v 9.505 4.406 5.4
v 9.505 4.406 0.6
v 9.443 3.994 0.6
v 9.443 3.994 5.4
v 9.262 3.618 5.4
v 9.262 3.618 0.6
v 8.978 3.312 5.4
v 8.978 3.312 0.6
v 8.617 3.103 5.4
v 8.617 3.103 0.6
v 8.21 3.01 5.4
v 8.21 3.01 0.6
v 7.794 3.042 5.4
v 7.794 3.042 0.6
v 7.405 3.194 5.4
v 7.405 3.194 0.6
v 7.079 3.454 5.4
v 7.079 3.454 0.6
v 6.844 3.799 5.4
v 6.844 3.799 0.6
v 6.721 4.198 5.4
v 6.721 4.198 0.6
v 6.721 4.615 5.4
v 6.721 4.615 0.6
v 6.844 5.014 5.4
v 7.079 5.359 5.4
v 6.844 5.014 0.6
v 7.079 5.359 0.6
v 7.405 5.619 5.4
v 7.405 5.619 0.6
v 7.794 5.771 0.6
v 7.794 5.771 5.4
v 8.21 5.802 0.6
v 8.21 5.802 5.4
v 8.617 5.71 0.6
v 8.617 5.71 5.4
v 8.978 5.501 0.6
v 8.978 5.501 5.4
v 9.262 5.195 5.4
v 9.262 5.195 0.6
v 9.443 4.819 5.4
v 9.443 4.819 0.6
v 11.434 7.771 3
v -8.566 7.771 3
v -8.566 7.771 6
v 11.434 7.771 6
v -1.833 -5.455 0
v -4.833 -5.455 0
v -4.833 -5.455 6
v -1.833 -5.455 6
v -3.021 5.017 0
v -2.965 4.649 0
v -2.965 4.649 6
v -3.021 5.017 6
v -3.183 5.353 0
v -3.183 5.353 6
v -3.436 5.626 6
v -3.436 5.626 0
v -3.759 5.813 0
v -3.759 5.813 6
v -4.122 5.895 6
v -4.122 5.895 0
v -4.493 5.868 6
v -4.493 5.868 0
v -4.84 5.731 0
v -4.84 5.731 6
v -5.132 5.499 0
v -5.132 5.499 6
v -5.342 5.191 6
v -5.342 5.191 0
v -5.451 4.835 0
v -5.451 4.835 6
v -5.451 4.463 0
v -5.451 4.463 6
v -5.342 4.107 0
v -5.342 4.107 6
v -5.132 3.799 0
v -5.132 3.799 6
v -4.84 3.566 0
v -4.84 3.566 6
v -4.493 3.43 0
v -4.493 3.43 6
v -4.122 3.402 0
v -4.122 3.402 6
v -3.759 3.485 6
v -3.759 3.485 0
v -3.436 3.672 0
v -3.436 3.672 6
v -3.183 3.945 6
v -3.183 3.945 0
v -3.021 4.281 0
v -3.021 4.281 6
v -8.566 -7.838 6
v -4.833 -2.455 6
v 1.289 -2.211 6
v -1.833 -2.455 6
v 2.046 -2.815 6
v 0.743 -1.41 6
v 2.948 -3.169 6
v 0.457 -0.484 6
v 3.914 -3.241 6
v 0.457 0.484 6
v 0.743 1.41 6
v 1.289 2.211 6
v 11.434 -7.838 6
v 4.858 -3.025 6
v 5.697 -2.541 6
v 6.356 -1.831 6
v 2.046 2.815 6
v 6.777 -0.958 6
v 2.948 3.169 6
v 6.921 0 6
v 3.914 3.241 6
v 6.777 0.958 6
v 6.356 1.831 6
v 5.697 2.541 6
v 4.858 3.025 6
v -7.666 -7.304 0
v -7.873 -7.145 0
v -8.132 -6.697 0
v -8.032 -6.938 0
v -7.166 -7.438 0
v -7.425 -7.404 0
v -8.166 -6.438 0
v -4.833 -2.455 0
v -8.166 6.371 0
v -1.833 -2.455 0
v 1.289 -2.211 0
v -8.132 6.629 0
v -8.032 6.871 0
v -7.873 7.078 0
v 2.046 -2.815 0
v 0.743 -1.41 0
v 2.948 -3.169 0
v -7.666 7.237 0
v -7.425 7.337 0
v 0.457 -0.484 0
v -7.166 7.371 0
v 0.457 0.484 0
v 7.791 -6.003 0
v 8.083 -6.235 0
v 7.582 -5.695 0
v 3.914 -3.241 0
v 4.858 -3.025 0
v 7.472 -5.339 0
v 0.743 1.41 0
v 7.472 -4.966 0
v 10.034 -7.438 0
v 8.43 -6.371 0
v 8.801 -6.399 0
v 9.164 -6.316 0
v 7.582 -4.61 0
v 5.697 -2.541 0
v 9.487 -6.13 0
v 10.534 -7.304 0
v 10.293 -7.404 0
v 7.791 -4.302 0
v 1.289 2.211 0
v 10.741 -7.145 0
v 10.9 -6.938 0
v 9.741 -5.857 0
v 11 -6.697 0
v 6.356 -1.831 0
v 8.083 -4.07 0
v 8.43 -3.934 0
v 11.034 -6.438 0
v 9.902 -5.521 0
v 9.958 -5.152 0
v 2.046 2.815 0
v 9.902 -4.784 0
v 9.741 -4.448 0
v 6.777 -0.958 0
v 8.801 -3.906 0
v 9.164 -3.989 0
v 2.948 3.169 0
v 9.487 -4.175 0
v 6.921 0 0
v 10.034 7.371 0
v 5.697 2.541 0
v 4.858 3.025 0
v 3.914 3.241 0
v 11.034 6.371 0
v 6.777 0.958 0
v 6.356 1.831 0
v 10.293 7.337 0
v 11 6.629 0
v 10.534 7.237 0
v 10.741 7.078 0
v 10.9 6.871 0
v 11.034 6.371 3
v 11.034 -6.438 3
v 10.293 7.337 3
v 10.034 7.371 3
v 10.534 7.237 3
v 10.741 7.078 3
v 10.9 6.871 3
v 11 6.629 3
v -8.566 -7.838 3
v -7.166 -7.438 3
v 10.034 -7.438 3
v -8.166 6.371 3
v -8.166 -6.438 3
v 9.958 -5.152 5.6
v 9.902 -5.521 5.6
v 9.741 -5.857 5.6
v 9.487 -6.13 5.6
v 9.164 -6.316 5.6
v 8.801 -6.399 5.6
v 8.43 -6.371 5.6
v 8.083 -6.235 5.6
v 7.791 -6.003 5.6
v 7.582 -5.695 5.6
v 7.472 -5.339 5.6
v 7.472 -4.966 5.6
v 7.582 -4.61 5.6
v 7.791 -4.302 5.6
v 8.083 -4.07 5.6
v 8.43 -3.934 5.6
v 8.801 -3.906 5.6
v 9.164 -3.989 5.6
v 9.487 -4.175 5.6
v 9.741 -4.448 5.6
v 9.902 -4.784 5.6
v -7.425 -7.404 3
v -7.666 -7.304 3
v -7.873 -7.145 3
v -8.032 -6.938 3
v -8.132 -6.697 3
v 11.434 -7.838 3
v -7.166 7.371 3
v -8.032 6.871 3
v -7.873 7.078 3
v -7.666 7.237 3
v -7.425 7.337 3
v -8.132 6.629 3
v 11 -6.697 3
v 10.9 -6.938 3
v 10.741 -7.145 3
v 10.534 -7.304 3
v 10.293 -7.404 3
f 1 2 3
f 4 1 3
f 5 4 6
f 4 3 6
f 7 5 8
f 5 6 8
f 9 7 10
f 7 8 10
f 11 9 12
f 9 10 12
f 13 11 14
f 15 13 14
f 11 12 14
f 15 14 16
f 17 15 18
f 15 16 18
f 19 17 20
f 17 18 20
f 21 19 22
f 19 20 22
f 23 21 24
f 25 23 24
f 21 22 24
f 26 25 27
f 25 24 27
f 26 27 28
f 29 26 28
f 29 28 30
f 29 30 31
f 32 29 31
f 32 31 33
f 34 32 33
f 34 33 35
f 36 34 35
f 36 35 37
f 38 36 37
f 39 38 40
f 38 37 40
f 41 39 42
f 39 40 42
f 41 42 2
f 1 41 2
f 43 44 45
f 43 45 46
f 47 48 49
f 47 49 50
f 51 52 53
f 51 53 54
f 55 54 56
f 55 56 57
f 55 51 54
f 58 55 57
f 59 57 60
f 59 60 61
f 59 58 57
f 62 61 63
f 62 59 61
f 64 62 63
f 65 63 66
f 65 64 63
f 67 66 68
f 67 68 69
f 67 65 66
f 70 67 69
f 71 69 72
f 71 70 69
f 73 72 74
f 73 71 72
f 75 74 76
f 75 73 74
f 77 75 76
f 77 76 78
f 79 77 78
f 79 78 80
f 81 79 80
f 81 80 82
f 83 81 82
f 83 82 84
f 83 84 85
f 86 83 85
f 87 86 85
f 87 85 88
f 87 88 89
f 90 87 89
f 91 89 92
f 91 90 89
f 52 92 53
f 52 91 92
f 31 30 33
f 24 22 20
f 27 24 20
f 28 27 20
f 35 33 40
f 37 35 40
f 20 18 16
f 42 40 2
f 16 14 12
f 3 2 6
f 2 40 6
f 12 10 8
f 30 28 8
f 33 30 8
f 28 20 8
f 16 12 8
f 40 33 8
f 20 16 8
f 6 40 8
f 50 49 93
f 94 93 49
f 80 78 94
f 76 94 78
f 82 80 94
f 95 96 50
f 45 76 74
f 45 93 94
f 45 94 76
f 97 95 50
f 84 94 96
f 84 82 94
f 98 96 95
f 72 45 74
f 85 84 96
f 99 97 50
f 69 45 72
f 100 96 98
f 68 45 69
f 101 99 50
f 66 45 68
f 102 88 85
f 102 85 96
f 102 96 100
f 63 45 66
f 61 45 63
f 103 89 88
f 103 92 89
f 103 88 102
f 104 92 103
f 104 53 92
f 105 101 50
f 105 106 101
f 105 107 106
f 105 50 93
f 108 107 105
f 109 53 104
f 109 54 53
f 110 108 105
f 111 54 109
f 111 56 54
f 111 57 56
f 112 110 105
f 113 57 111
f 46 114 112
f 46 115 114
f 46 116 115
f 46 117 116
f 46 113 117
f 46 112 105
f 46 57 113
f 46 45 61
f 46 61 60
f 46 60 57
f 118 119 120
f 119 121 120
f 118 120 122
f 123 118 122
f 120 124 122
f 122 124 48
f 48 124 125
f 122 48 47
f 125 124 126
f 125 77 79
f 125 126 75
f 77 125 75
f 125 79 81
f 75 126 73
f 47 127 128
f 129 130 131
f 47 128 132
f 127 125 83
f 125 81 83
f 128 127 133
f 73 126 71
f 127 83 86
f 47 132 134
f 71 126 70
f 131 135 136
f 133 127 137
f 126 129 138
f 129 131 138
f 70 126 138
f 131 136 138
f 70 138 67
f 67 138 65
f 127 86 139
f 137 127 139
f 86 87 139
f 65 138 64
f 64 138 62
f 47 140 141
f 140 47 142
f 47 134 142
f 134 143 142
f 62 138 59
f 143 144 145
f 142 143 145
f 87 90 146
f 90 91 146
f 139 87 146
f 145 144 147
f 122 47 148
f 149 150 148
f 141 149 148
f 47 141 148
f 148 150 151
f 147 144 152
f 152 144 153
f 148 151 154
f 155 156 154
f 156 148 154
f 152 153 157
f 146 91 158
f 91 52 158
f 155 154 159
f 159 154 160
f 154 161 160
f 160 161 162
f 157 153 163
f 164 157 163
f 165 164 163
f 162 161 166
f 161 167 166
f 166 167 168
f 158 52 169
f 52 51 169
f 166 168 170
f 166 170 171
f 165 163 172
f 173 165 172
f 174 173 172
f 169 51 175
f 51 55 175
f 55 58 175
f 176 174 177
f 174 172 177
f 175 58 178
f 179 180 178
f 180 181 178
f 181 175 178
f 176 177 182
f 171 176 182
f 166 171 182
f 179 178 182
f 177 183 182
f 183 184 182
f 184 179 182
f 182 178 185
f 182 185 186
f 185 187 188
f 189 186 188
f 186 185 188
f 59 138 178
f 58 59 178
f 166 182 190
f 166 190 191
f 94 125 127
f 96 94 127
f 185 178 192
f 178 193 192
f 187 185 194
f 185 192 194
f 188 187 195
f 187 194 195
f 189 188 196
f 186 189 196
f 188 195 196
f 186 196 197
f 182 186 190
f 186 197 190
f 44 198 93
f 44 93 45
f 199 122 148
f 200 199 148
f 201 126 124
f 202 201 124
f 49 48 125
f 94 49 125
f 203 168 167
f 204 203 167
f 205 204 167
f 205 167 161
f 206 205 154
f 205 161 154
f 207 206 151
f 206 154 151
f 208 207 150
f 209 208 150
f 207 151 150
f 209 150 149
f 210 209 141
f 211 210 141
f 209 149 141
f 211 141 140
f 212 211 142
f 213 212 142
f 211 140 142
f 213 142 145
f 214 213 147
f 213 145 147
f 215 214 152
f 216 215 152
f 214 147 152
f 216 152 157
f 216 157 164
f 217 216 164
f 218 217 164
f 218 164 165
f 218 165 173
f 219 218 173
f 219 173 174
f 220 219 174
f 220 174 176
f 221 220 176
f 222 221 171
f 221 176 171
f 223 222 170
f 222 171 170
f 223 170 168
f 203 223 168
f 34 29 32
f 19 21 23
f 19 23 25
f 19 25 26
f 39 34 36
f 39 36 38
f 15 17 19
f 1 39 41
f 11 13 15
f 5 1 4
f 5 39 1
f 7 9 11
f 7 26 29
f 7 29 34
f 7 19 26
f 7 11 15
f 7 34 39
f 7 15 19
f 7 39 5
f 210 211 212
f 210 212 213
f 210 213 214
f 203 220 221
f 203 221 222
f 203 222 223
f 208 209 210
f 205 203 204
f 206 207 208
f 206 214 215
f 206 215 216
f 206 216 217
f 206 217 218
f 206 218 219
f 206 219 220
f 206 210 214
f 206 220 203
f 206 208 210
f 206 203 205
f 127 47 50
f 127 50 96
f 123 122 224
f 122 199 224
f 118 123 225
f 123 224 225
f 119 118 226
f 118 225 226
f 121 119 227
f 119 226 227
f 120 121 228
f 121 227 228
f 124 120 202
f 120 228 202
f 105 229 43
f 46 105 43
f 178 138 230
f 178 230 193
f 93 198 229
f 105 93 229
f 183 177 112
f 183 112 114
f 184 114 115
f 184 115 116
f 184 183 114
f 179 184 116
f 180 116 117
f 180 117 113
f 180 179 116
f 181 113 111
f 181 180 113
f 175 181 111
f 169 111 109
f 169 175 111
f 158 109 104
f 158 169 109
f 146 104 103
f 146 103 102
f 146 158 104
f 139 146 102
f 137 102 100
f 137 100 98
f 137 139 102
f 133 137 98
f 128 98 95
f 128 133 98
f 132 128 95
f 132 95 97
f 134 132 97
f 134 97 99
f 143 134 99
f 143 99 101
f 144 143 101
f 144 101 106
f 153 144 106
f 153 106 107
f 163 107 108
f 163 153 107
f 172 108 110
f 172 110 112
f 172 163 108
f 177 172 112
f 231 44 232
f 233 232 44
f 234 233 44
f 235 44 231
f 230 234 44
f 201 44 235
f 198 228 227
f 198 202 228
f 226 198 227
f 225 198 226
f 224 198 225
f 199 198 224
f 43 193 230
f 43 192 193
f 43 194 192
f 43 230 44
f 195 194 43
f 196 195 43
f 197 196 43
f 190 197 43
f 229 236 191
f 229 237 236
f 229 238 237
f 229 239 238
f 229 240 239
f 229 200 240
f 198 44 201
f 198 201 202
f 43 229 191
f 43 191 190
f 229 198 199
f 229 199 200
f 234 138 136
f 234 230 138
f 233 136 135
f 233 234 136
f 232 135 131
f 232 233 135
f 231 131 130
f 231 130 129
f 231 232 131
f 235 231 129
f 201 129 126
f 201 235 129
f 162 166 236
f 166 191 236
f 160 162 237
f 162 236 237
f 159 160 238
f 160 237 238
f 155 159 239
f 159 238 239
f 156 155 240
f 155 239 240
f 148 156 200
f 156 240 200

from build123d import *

# Parameters (mm, degrees)
F0_W     = 20
F0_H     = 15.6083446927
F0_W_2   = 3
F0_H_2   = 3
F0_R     = 1.25
F0_R_2   = 3.25
F1_DEPTH = 6
F2_R     = 1.25
F3_DEPTH = 5.6
F4_W     = 20
F4_H     = 15.6083446927
F4_W_2   = 19.2
F4_H_2   = 14.8083446927
F5_DEPTH = 3
F7_START = -0.6
F6_R     = 1.4
F7_DEPTH = 4.8
F8_R     = 1


with BuildPart() as f1:
    # F0 (on Top) → F1 (new body)
    with BuildSketch(Plane.XY):
        with Locations((1.4342954904, -0.0335501973)):
            Rectangle(F0_W, F0_H)
        with Locations((-3.3330191961, -3.9553961381)):
            Rectangle(F0_W_2, F0_H_2, mode=Mode.SUBTRACT)
        with Locations((-4.2153447866, 4.6489532106)):
            Circle(F0_R, mode=Mode.SUBTRACT)
        with Locations((3.6709753331, 0)):
            Circle(F0_R_2, mode=Mode.SUBTRACT)
    extrude(amount=F1_DEPTH)

    # F2 (on face) → F3 (cut)
    with BuildSketch(Plane(origin=(0, 0, 0), x_dir=(1, 0, 0), z_dir=(0, 0, -1))):
        with Locations((8.7077384815, 5.1523931324)):
            Circle(F2_R)
    extrude(amount=-F3_DEPTH, mode=Mode.SUBTRACT)

    # F4 (on face) → F5 (cut)
    with BuildSketch(Plane(origin=(0, 0, 0), x_dir=(1, 0, 0), z_dir=(0, 0, -1))):
        with Locations((1.4342954904, 0.0335501973)):
            Rectangle(F4_W, F4_H)
        with Locations((1.4342954904, 0.0335501973)):
            Rectangle(F4_W_2, F4_H_2, mode=Mode.SUBTRACT)
    extrude(amount=-F5_DEPTH, mode=Mode.SUBTRACT)

    # F6 (on face) → F7 (cut)
    with BuildSketch(Plane(origin=(0, 0, 0), x_dir=(1, 0, 0), z_dir=(0, 0, -1)).offset(F7_START)):
        with Locations((8.1054680049, -4.4064032845)):
            Circle(F6_R)
    extrude(amount=-F7_DEPTH, mode=Mode.SUBTRACT)

    # F8
    f8_edges = [f1.edges().sort_by_distance(p)[0] for p in [
        (11.034295, 7.370622, 1.5),
        (-8.165705, 7.370622, 1.5),
        (-8.165705, -7.437723, 1.5),
        (11.034295, -7.437723, 1.5),
    ]]
    fillet(f8_edges, radius=F8_R)


solid = f1.part
